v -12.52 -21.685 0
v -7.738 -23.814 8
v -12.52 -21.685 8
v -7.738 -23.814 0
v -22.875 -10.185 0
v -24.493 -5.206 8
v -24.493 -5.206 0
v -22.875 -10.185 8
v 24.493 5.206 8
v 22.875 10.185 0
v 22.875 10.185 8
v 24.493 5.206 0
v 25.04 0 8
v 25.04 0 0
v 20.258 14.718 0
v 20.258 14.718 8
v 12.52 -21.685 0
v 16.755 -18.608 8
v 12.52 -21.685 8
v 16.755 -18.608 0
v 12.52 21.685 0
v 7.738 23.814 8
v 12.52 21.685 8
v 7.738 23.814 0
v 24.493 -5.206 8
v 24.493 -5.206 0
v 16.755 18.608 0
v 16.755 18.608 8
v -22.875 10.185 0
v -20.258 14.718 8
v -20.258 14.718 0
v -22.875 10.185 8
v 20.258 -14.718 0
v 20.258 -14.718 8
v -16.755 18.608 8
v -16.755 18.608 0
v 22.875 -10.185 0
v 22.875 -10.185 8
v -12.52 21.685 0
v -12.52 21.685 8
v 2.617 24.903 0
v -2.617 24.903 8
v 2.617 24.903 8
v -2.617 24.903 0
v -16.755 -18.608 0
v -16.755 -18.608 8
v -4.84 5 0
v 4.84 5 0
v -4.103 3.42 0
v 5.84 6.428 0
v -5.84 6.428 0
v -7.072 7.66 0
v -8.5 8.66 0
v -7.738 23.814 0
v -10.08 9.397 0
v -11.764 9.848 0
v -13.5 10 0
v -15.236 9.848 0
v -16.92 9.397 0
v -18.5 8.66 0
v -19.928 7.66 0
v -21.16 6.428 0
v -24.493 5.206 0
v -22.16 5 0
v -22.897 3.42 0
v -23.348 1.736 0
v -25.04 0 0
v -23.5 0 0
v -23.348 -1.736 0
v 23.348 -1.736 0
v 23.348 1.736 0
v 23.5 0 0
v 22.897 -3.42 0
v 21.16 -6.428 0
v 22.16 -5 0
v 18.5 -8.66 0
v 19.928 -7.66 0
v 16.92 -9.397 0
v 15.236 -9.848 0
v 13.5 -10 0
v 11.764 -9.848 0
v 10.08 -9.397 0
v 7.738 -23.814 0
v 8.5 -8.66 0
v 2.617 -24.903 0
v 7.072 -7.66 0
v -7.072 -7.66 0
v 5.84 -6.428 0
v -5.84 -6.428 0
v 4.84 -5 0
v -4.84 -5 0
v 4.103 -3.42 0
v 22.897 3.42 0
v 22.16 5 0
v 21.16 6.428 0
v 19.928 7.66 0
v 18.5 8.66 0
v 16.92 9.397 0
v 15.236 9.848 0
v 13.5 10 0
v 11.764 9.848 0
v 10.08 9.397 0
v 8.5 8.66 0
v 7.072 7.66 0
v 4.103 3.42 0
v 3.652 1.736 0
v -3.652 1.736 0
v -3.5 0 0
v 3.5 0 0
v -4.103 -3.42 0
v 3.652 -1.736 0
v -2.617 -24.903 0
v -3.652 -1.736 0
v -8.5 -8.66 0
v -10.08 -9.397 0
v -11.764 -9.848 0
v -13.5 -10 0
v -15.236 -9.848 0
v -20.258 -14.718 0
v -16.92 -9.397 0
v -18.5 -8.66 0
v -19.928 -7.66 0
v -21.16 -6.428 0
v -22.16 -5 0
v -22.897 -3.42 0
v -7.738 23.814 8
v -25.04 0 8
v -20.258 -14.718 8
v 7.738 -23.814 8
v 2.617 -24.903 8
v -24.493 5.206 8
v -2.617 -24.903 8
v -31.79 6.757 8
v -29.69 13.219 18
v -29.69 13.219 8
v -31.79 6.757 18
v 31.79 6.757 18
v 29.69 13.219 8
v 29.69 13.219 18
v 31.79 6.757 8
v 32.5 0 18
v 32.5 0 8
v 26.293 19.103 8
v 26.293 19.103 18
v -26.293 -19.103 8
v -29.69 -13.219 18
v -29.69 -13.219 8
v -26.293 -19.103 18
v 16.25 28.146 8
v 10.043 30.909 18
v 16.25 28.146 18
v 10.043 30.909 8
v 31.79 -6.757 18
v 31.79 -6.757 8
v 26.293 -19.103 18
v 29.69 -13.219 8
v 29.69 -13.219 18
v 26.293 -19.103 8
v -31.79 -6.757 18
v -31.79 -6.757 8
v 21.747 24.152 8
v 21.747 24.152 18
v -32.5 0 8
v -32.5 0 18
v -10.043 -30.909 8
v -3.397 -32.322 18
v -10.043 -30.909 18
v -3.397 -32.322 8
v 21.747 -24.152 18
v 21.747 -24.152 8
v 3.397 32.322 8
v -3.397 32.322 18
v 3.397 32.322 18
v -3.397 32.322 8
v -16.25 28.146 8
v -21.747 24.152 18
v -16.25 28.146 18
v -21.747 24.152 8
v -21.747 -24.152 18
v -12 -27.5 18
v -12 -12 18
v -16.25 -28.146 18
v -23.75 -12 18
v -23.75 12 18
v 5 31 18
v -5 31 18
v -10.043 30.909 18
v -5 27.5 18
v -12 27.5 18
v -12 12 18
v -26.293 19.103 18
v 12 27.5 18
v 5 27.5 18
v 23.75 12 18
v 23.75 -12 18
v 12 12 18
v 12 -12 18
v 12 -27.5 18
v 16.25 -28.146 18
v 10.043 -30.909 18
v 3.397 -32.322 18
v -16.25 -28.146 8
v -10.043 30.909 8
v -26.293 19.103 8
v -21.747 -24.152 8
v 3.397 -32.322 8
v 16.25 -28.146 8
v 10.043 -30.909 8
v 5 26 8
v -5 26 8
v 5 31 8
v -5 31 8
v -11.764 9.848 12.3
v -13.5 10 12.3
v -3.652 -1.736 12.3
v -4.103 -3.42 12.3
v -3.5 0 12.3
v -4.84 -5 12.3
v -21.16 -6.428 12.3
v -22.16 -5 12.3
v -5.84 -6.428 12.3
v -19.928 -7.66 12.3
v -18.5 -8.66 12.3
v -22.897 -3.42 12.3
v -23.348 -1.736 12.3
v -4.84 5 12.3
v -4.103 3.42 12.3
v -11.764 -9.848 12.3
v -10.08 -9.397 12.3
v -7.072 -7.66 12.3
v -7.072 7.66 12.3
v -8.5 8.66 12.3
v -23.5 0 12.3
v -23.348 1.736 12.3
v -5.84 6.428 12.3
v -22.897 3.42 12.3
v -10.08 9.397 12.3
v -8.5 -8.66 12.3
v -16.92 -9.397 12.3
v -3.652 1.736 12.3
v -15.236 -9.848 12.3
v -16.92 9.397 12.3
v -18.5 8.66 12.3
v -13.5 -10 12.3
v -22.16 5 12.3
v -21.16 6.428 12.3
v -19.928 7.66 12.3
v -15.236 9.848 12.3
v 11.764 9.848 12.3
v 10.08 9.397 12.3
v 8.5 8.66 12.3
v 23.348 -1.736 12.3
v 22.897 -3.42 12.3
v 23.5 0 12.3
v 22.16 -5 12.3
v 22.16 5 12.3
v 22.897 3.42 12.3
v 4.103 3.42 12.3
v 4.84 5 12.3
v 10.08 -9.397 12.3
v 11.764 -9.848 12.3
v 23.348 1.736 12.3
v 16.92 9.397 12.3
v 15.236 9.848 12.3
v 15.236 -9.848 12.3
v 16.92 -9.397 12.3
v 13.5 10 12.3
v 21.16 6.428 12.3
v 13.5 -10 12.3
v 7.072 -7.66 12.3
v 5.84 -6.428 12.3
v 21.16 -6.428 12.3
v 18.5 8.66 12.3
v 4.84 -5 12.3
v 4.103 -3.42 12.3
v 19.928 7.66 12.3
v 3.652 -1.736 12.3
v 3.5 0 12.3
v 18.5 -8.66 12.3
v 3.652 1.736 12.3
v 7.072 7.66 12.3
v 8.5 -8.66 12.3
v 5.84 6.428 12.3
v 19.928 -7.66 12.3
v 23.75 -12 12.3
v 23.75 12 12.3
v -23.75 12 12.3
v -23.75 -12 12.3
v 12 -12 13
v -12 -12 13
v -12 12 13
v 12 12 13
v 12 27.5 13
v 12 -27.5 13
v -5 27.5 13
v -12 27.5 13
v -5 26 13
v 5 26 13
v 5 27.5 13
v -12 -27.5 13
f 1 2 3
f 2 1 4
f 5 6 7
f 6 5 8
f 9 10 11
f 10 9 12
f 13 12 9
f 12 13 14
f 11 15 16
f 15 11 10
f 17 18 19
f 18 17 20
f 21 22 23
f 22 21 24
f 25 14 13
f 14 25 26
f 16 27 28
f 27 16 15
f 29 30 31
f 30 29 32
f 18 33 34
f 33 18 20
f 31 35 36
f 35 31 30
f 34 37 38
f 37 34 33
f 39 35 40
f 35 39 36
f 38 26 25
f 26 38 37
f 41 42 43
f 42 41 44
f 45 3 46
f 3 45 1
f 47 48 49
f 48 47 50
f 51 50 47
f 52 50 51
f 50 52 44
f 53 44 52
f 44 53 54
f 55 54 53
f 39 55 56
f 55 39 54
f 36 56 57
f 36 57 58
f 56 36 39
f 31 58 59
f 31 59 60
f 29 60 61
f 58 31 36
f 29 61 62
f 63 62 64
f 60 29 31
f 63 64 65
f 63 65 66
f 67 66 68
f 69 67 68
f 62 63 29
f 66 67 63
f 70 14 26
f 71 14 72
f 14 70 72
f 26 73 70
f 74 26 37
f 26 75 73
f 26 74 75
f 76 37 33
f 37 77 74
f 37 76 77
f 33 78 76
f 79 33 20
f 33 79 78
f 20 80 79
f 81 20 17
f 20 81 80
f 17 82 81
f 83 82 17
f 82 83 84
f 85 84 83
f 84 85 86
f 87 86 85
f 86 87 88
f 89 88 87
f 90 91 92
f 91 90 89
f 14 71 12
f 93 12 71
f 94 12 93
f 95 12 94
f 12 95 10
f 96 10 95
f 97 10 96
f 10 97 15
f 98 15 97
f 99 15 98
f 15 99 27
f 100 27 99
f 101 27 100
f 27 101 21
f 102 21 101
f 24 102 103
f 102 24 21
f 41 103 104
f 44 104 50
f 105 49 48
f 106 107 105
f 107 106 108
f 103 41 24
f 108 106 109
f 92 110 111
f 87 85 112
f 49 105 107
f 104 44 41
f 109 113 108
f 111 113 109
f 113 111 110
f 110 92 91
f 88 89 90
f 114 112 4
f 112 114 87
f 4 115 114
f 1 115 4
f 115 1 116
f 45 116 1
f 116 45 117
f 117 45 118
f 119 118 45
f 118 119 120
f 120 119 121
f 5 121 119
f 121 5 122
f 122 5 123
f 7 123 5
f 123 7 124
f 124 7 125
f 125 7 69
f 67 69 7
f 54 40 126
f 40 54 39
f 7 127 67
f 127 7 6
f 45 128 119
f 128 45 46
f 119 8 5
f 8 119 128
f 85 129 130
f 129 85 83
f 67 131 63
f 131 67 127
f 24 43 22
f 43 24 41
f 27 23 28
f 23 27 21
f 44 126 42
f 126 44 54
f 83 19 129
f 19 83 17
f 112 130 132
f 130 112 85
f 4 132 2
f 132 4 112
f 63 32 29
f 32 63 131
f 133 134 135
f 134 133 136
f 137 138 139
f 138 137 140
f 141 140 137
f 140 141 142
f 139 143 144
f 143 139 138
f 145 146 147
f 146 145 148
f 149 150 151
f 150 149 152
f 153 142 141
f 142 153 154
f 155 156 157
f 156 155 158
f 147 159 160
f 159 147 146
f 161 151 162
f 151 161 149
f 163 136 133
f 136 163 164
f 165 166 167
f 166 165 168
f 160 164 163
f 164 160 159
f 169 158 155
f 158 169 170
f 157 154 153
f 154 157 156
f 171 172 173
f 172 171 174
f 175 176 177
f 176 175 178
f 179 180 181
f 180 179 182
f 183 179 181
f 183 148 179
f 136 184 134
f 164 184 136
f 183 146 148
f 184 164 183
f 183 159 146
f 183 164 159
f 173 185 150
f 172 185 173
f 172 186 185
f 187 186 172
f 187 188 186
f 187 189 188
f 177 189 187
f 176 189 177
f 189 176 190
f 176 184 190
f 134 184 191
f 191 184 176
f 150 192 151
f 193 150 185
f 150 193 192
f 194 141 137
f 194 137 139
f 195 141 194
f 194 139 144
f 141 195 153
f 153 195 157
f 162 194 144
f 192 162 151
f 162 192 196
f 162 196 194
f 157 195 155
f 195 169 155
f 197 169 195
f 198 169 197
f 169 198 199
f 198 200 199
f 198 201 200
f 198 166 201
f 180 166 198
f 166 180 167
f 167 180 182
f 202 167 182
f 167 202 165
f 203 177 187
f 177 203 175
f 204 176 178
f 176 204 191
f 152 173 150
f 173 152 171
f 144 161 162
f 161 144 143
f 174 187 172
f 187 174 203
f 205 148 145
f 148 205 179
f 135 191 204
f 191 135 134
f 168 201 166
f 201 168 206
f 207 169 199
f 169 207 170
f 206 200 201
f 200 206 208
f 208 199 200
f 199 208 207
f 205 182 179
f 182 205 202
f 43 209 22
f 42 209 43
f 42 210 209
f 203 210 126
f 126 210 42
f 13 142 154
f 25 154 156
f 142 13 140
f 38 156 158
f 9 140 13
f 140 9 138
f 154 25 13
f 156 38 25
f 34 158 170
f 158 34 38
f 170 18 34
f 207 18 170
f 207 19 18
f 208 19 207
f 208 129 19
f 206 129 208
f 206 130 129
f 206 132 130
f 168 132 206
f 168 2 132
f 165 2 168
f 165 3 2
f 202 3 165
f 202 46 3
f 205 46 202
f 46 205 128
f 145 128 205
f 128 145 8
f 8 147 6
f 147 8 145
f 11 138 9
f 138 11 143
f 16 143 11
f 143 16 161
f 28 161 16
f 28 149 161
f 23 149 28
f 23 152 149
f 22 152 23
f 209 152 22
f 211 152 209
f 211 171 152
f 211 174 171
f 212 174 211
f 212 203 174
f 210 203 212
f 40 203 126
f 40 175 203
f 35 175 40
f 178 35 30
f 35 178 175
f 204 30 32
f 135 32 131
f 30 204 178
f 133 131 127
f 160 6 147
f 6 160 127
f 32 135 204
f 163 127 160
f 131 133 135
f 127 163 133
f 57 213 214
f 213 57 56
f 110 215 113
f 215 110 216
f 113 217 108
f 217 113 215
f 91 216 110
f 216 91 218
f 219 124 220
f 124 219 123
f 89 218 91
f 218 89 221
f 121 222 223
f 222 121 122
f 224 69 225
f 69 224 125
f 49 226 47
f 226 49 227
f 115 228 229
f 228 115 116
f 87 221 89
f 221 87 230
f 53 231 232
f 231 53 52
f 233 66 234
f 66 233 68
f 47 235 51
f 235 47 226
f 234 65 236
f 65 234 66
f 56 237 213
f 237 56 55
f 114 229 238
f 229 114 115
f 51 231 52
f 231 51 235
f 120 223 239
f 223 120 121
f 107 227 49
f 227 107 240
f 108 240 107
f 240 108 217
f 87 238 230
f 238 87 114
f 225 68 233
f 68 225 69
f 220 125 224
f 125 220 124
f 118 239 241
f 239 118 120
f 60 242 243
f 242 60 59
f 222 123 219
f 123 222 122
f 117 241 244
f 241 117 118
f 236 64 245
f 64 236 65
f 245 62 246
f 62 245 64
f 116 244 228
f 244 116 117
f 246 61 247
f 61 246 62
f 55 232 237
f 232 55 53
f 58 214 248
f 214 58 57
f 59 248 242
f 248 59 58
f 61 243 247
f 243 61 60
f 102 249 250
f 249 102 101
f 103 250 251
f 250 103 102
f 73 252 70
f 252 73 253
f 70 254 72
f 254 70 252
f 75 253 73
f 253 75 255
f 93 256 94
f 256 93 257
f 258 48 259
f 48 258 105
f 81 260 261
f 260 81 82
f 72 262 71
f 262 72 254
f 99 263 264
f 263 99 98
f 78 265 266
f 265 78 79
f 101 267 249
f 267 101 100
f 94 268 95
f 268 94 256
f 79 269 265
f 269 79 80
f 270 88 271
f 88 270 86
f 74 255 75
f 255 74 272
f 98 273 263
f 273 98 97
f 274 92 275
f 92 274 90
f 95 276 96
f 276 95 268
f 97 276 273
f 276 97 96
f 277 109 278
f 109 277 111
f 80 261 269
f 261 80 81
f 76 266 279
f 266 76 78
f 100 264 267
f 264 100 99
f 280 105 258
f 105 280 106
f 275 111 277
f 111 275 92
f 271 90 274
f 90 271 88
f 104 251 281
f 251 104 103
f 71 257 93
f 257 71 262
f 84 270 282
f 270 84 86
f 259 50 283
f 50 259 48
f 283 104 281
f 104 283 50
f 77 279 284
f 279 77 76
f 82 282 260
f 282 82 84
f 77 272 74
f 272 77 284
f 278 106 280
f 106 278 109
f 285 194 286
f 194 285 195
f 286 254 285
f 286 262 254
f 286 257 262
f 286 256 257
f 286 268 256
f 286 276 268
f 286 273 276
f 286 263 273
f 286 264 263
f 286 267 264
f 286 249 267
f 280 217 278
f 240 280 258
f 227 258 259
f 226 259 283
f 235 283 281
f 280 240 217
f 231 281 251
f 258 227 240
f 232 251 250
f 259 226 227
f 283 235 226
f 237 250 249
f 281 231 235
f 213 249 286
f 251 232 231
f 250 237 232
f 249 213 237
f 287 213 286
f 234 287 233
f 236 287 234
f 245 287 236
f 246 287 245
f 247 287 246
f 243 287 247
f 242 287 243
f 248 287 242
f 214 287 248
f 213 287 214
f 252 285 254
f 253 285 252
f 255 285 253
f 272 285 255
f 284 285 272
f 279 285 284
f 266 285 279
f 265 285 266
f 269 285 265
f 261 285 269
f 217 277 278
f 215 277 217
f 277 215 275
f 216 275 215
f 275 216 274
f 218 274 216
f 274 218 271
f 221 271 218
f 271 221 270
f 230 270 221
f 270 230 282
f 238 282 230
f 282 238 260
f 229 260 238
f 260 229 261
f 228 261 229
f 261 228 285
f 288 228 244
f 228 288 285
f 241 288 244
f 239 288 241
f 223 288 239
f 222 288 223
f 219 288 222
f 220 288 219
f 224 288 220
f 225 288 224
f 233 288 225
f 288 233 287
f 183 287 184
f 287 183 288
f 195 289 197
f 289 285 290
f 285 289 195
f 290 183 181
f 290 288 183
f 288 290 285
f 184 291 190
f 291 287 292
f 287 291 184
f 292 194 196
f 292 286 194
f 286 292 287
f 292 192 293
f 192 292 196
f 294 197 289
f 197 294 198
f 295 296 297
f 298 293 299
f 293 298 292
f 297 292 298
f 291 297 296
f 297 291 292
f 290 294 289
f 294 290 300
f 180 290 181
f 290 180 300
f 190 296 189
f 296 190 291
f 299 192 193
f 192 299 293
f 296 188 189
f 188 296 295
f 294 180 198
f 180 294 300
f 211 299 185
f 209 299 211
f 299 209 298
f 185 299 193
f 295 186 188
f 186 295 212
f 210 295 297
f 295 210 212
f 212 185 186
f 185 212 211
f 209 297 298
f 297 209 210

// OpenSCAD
// file: HC-SR04.scad
//---------------------------------------------------------------
//-- Openscad HC-SR04 module
//-- (C) Juan Pedro López (jotape)
//-- May-2013
//---------------------------------------------------------------
//-- Released under the GPL license
//---------------------------------------------------------------

//------------------------------------------------------------------
//-- Draw an HC-SR04 sensor module
//------------------------------------------------------------------

module HCSR04() {
  // Draw the sensors
  translate(v = [-13.5, 0, 7.5]) {
    cylinder(h = 13.8, r = 10, center = true, $fn=36);
  }

  translate(v = [13.5, 0, 7.5]) {
    cylinder(h = 13.8, r = 10, center = true, $fn=36);
  }

  translate([0, 0, -4.3])
    cube(size = [47.5,24,10], center = true);
}
// main file
use <HC-SR04.scad>;

module cap_shape() {
  base_height = 10;
  union() {
      cylinder(h=base_height, d=50.08);
      translate([0, 0, base_height-2])
        cylinder(d=65, h=10);
  }

}

module wiring_space() {
  translate([0, 0, 18])
    cube(size = [24, 55,10], center=true);

  translate([0, 28.5, 0])
    cube([10, 5, 50], center=true);
}


module cap() {
  difference() {
    cap_shape();
    translate([0, 0, 13]) rotate([180, 0, 0]) {
      HCSR04();
    }
    wiring_space();
  }
}

cap();

/*HCSR04();*/
